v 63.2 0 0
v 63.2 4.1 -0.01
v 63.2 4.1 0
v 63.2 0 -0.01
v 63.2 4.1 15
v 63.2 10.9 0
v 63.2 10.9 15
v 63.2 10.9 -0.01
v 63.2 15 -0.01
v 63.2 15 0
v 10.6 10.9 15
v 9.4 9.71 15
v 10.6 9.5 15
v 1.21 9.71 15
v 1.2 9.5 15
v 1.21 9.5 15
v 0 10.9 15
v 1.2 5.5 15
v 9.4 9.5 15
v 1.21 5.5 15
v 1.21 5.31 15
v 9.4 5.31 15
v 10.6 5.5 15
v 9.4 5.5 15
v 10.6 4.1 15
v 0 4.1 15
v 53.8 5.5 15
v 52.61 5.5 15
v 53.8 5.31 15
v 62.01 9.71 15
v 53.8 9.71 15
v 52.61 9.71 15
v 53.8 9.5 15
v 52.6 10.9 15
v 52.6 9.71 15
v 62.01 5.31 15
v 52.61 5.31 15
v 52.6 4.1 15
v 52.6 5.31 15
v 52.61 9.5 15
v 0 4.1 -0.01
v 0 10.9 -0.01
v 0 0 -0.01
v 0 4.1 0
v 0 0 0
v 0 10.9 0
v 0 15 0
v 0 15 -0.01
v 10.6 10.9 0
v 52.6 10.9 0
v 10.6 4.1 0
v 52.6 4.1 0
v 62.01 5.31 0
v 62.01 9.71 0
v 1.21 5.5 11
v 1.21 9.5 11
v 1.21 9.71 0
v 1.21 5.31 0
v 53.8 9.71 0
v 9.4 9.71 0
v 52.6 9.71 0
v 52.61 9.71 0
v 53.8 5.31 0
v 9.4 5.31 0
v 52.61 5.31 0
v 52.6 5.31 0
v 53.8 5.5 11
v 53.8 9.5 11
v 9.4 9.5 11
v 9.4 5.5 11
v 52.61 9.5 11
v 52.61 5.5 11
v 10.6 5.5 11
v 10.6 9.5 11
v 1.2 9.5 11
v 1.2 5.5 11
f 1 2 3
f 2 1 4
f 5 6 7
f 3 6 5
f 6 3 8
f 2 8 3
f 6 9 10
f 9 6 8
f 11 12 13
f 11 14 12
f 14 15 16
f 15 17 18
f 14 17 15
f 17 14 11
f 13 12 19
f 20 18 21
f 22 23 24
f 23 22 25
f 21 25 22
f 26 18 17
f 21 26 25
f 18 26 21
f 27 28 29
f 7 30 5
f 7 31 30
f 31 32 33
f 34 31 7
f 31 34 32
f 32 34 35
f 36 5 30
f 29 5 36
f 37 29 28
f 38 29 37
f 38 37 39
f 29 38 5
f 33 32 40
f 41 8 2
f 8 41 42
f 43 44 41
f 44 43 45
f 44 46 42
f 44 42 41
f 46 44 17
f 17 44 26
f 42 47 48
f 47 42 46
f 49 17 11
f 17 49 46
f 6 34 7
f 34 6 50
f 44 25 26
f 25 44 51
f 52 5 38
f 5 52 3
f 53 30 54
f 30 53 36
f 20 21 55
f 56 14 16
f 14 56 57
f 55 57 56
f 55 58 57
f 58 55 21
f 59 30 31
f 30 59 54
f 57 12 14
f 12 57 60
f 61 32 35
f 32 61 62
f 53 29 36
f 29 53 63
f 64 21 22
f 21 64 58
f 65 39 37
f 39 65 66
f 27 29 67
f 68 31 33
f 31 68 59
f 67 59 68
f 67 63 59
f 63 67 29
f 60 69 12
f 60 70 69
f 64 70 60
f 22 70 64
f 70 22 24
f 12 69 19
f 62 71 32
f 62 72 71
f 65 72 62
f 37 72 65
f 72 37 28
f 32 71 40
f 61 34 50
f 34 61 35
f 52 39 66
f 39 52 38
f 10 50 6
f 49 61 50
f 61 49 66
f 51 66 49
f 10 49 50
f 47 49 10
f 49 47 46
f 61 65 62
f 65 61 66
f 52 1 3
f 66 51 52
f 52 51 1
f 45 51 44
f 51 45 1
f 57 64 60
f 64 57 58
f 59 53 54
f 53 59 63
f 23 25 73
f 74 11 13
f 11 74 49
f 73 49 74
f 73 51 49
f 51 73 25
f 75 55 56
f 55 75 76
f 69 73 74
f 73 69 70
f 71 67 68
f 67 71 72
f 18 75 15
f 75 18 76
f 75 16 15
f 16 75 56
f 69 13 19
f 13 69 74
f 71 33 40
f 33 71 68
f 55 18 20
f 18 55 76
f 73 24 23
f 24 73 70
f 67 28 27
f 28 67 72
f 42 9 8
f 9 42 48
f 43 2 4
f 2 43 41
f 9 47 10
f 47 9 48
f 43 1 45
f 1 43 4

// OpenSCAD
// file: ../Base/PlacementOptions.scad
// Fischertechnik Box Foundation
// Placement Options

// Alignment
NoAlign = 0;
AlignLeft = 1;
AlignBottom = 2;
AlignCenter = 3;
AlignRight = 4;
AlignTop = 5;

// Element rotation degree steps
rotations = [0, -90, -180, -270];

// Rotation
NoRotation = 0;
Rotate0 = 0;
Rotate90 = 1;
Rotate180 = 2;
Rotate270 = 3;

// Docking (seen from above)
NoDock = -1;
DockLeft = 0;
DockTop = 1;
DockRight = 2;
DockCorner = 2;
DockBottom = 3;

// Web corners
LowerLeft = 0;
UpperLeft = 1;
UpperRight = 2;
LowerRight = 3;

// Web position relative to corner
LeftOfCorner = 0;
RightOfCorner = 1;
// file: ../Base/Boxes.scad
// Fischertechnik Box Foundation
// Pre-designed Boxes

use <Constants.scad>

include <PlacementOptions.scad>

box190Width = 190;
box190Depth = 130;
box130Width = 130;
box130Depth = 95;

// Values are from an original ec3 box
topBottomDifference = 1.5;
outerHeight = 40;
baseThickness = 1.8;
innerHeight = outerHeight - baseThickness;
stackExcess = 5.7;
radius = 3.5;
wallThickness = 1.5;
tolerance = 0.2;

boxWallThickness = wallThickness;
boxBaseThickness = baseThickness;
boxWebWidth = 3.0;

// getBoxWallThickness()
// Gets the wall thickness of a Fischertechnik Box
function getBoxWallThickness() = boxWallThickness;

// getBoxUsageHeight(height = 38.2)
// Gets the usable height of a Fischertechnik box
// height = Outer height of the box from the bottom to the upper edge.
function getBoxUsageHeight(height = outerHeight) = height - baseThickness - stackExcess;

// getBoxInnerHeight()
// Gets the inner height of a Fischertechnik box, including the stack excess
function getBoxInnerHeight() = innerHeight;

// getBoxBaseThickness()
// Gets the thickness of the Fischertechnik box base.
function getBoxBaseThickness() = boxBaseThickness;

// getBoxWebWidth()
// Gets the width of a box web
function getBoxWebWidth() = boxWebWidth;

// getBox190Space()
// Gets the usable inner space of a Box 190 as an x/y-list
function getBox190Space() = [
    box190Width - 2*getBoxWallThickness() - topBottomDifference, 
    box190Depth - 2*getBoxWallThickness() - topBottomDifference ];

// RoundedCornerPlate(width, depth, height, radius)
// Creates a body plate with rounded corners for a box. Used
// also to create the complete box with the hull module.
// width = Width of the plate
// depth = depth of the plate 
// height = thickness of the plate
// radius = radius of the rounded corner
module RoundedCornerPlate(width, depth, height, radius) {
    translate([radius, radius])
    hull() {
        w = width-2*radius;
        d = depth-2*radius;
        cube([w, d, height]);
        cylinder(height, r=radius, $fn=getFragments());
        translate([w, 0])
            cylinder(height, r=radius, $fn=getFragments());
        translate([w, d])
            cylinder(height, r=radius, $fn=getFragments());
        translate([0, d])
            cylinder(height, r=radius, $fn=getFragments());
    }
}

// BoxBase(width, depth)
// Creates an empty stackable Fischertechnik compatible box
// width = Outer width of the box (190, 130, ...)
// depth = Outer depth of the box (130, 95, ...)

module BoxBase(width, depth, height=outerHeight) {    
    thinPlate = 0.01;

    innerHeight = height - baseThickness;    
    
    module Body(tolerance=tolerance) {
        hull() {
            // Bottom with tolerance to fit into the original boxes when stacked
            translate([-wallThickness+tolerance, -wallThickness+tolerance, -baseThickness])
                RoundedCornerPlate(width-topBottomDifference-2*tolerance, depth-topBottomDifference-2*tolerance, thinPlate, radius);
            
            // Top
            translate([-wallThickness-topBottomDifference/2, -wallThickness-topBottomDifference/2, innerHeight-thinPlate])
                RoundedCornerPlate(width, depth, thinPlate, radius);
         }
    }

    module Cutoff() {
        hull() {
            coWidth = width - 2*wallThickness;
            coDepth = depth - 2*wallThickness;
            
            // Bottom
            RoundedCornerPlate(coWidth-topBottomDifference, coDepth-topBottomDifference, thinPlate, radius);

            // Top
            translate([-topBottomDifference/2, -topBottomDifference/2, innerHeight+thinPlate]) 
                RoundedCornerPlate(coWidth, coDepth, thinPlate, radius);
        }
    }
    
    difference() {        
        Body();
        Cutoff();
        stackOffset = innerHeight - stackExcess;
        translate([0, 0, stackOffset + baseThickness])
            Body(tolerance=0);
    }
}

// Creates the Fischertechnik empty box 130x190 mm and places it at position 0,0
// 190x130 are the outer sizes, the inner space is slightly smaller. Use getBox190Space() to get the inner sizes.
// The box is positioned that the usable inner space is at the 0,0,0 position.

module Box190() {
    BoxBase(box190Width, box190Depth);
}

// Gets the usable inner space of a Box 130 as an x/y-list
function getBox130Space() = [
    box130Width - 2*getBoxWallThickness() - topBottomDifference, 
    box130Depth - 2*getBoxWallThickness() - topBottomDifference ];

// Creates the Fischertechnik empty box 95x130 mm and places it at position 0,0
// 190x130 are the outer sizes, the inner space is slightly smaller. Use getBox190Space() to get the inner sizes.
// The box is positioned that the usable inner space is at the 0,0,0 position.

module Box130() {
    BoxBase(box130Width, box130Depth);
}

// Creates a web at the specified box walls
// corner 0 = LowerLeft, 1 = UpperLeft, 2 = UpperRight, 3 = LowerRight
// side 0 = LeftOfCorner, 1 = RightOfCorner
// distance = Distance in mm from the corner
// boxSpace = inner width and depth of the box (default: Box 190)
// webWidth = length of the web (default is 3 mms)
// webThickness = thickness of the web (default is 1 mm)
// height = Height of the web (standard is getBoxUsageHeight())

module BoxWeb(corner, side, distance, boxSpace=getBox190Space(), webWidth=getBoxWebWidth(), webThickness=1.0, height=getBoxUsageHeight()) {
    sink = getBoxWallThickness()/2;

    width = (corner % 2 == 0) ? 
            (side == LeftOfCorner ? webWidth : webThickness) :
            (side == LeftOfCorner ? webThickness : webWidth);

    depth = (corner % 2 == 0) ? 
            (side == RightOfCorner ? webWidth : webThickness) :
            (side == RightOfCorner ? webThickness : webWidth);
    
    xDiff = corner == LowerLeft ? 
                (side == LeftOfCorner ? -sink : distance) :
            (corner == UpperLeft ?                
                (side == LeftOfCorner ? distance : -sink) :
            (corner == UpperRight ?
                (side == LeftOfCorner ? boxSpace.x-webWidth+sink : boxSpace.x-distance-webThickness) :
                (side == LeftOfCorner ? boxSpace.x-distance-webThickness: boxSpace.x-webWidth+sink)));

    yDiff = corner == LowerLeft ? 
                (side == RightOfCorner ? -sink : distance) :
            (corner == UpperLeft ?
                (side == RightOfCorner ? boxSpace.y-distance-webThickness : boxSpace.y-webWidth+sink) :
            (corner == UpperRight ?
                (side == RightOfCorner ? boxSpace.y-webWidth+sink : boxSpace.y-distance-webThickness) :
                (side == RightOfCorner ? distance : -sink)));
    
    translate([xDiff, yDiff, -getExcess()])
        cube([width, depth, height + 2*getExcess()]);
}
// file: ../Base/Rotation.scad
// Fischertechnik Box Foundation
// Geometry Helpers Rotation

include <PlacementOptions.scad>

// getRotatedSpace(space, rotation=NoRotation)
// Rotates the space dependent on the specified rotation

function getRotatedSpace(space, rotation=NoRotation) = [
    (rotation == Rotate90 || rotation == Rotate270) ? space.y : space.x,
    (rotation == Rotate90 || rotation == Rotate270) ? space.x : space.y
];

// Rotates the given space around the fixed left lower corner
// space = the space the children needs as width/depth list [width,depth]
// rotation = 0 Rotate0 degrees, 1 Rotate90 degrees, 2 Rotate180 degrees, 3 Rotate270 degrees (equivalent to -90)

module RotateFix(space, rotation=NoRotation) {
    dy = (rotation == Rotate0 || rotation == Rotate270) ? 0 :
        (rotation == Rotate90) ? space.x :
        space.y;
    dx = (rotation < Rotate180) ? 0 :
        (rotation == Rotate180) ? space.x :
        space.y;
    
    translate([dx, dy, 0])
        rotate([0, 0, rotations[rotation]])
            children();
}
// file: ../Base/Alignment.scad
// Fischertechnik Box Foundation
// Geometry Helpers Alignment

include <PlacementOptions.scad>

// getAlignedX(elementWidth, spaceWidth, align=AlignRight, offset=0)
// Gets the aligned X offset of an element with the given
// width in the given space.
// elementWidth = The width of the element to positon
// spaceWidth = The space where the element should be aligned
// align = 0 AlignLeft, 1 AlignCenter, 2 AlignRight
// offset = an optional offset from the aligned position. When
// aligned left or centered, then positive values are in X direction.
// When aligned right then positive values are in negative X direction.

function getAlignedX(elementWidth, spaceWidth, align=AlignRight, offset=0) =
    (align == AlignLeft) ?
        offset :
        ((align == AlignCenter) ?
        (spaceWidth - elementWidth)/2 + offset :
        spaceWidth - offset - elementWidth);

// getAlignedY(elementDepth, spaceDepth, align=AlignTop, offset=0)
// Gets the aligned Y offset of an element with the given
// depth in the given space.
// elementDepth = The depth of the element to positon
// spaceDepth = The space where the element should be aligned
// align = 0 AlignBottom, 1 AlignCenter, 2 AlignTop
// offset = an optional offset from the aligned position. When
// aligned bottom or centered, then positive values are in Y direction.
// When aligned top then positive values are in negative Y direction.

function getAlignedY(elementDepth, spaceDepth, align=AlignTop, offset=0) =
    (align == AlignBottom) ?
        offset :
        ((align == AlignCenter) ?
        (spaceDepth - elementDepth)/2 + offset :
        spaceDepth - offset - elementDepth);
// file: ../Base/Constants.scad
// Fischertechnik Box Foundation
// Constants

// Constant values necessary for multiple elements

// Base constants
dividerThickness = 1.2;
excess = 0.01;
fragments = 90;
tolerance = 0.8;

// Gets the thickness of a divider 
function getDividerThickness() = dividerThickness;

// Gets the excess that is used to merge walls into each other
function getExcess() = excess;

// Gets amount of fragments of a cylinder
function getFragments() = fragments;

// Gets the inner tolerance of a frame to each side
function getTolerance() = tolerance;


// Fischertechnik specific constants
axisDiameter = 4;
axisBottomDiameter = axisDiameter + 1;
axisTolerance = 0.2;

// Gets axis diameter of Fischertechnik axis
function getAxisDiameter() = axisDiameter;

// Gets axis diameter tolerance (subtracted for element axis)
function getAxisTolerance() = axisTolerance;

// Gets the axis diameter for standing axis
function getStandAxisDiameter() = getAxisDiameter() - getAxisTolerance();

// Gets axis bottom diameter for thicker part at the bottom
function getAxisBottomDiameter() = axisBottomDiameter;

standardEdgeDistance = 2.5;
standardWebDistance = 11.5;
standardCornerLength = 15;

// gets the standard distance to the wall of the box for dockable frames with webs
function getStandardEdgeDistance() = standardEdgeDistance;

// gets the standard distance of each web to the corner of the dockable frame
function getStandardWebDistance() = standardWebDistance;

// gets the standard length of the corner walls of a dockable frame
function getStandardCornerLength() = standardCornerLength;

tubeWallFactor = 0.8;

// gets the wall thickness of a tube.
function getTubeWallThickness() = tubeWallFactor * getDividerThickness();

smallPartsFrameHeight = 20;

// gets the frame height for docked small parts boxes.
function getSmallPartsFrameHeight() = smallPartsFrameHeight;

hubRingDiameter = 19.5;
hubRingLevelDiameter = 21;

// gets the diameter of a tube matching the inner ring of a wheel
function getHubRingDiameter() = hubRingDiameter;

// gets the diameter of a hub tube with a thicker diameter
function getHubRingLevelDiameter() = hubRingLevelDiameter;
// file: FrameAxis60.scad
// Fischertechnik Box Library
// Frame for single 60 mm Axis
// 31032

use <../ModelBase/Complex.scad>

length = 60;

// getFrameAxis60Space()
// Gets the width (.x) and depth (.y) of the axis frame.

function getFrameAxis60Space() = getFrameAxisSpace(length);

// FrameAxis60()
// Axis holder for a single 60 mm axis.

module FrameAxis60() {
    FrameAxis(length);
}

// Test
color("lightgray")
FrameAxis60();
// file: ../Base/Placement.scad
// Fischertechnik Box Foundation
// Geometry Helpers Placement

use <Constants.scad>
use <Alignment.scad>
use <Rotation.scad>
use <Boxes.scad>

include <PlacementOptions.scad>

// Place(x=0, y=0, elementSpace=[0,0], alignX=AlignLeft, alignY=AlignBottom, rotation=Rotate0, boxSpace=getBox190Space())
// Places the child at the specified position
// y = Y-Position. This is a relative position when an X aligment is specified.
// x = X-Position. This is a relative position when an Y aligment is specified.
// elementSpace = space of the element to be placed [x,y]
// alignX = -1=NoAlign, 0 AlignLeft, 1 AlignCenter, 3 AlignRight (elementSpace and boxSpace required!)
// alignY = -1=NoAlign, 2 AlignBottom, 1 AlignCenter, 4 AlignTop (elementSpace and boxSpace required!)
// rotation = 0 Rotate0 0 degrees, 1 Rotate90 90 degrees, 
// 2 Rotate180 180 degrees, 3 Rotate270 270 degrees (equivalent to -90)
// boxSpace = Inner space of the box where the placement occurs [x,y] - default is Box 190x130 inner space

module Place(x=0, y=0, elementSpace=[0,0], 
  alignX=AlignLeft, alignY=AlignBottom, 
  rotation=NoRotation, boxSpace=getBox190Space()) {

    module Position(x, y, space, rotation=Rotate0) {
        translate([x, y, 0])
            RotateFix(space, rotation)
                children();
    }

    space = getRotatedSpace(elementSpace, rotation);
    alignedX = getAlignedX(space.x, boxSpace.x, alignX, x);
    alignedY = getAlignedY(space.y, boxSpace.y, alignY, y);
    Position(alignedX, alignedY, elementSpace, rotation)
        children();
}

// Center(space=getBox130Space(), elementSpace=[0,0])
// space = Space where the children is centered. For cylinder use centered=true and no elementSpace.
// elementSpace = space of the element to be centered [x,y]

module Center(space=getBox190Space(), elementSpace=[0,0]) {
    Place(elementSpace=elementSpace, boxSpace=space, alignX=AlignCenter, alignY=AlignCenter)
        children();
}

// CenterHorizontal(width=0, y=0, offset=0, space=getBox130Space())
// width = Width of the element to be placed.
// y = Y position of the element
// offset = Offset from the center position (negative will be left of the center)
// space = Space where the element is placed

module CenterHorizontal(width=0, y=0, offset=0, space=getBox190Space()) {
    Place(x=offset, y=y, elementSpace=[width, 0], boxSpace=space, alignX=AlignCenter)
        children(0);
}

// CenterVertical(depth=0, x=0, offset=0, space=getBox130Space())
// depth = Depth of the element to be placed.
// x = X position of the element
// offset = Offset from the center position (negative will be down of the center)
// space = Space where the element is placed

module CenterVertical(depth=0, x=0, offset=0, space=getBox190Space()) {
    Place(x=x, y=offset, elementSpace=[0, depth], boxSpace=space, alignY=AlignCenter)
        children(0);
}

// getIsVertical(align)
// True if the specified alignment needs a vertical orientation for a divider (AlignRight, AlignLeft)

function getIsVertical(align) = (align == AlignRight || align == AlignLeft);

// getIsHorizontal(align)
// True if the specified alignment needs a horizontal orientation for a divider (AlignTop, AlignBottom)

function getIsHorizontal(align) = (align == AlignTop || align == AlignBottom);
// main file
// Fischertechnik Box Library
// Frame for 60 mm Axis with gear wheel 28
// 31063

use <../Base/Placement.scad>
use <../ModelBase/Simple.scad>
use <FrameAxis60.scad>

/* [Hidden] */
depth = 15;

// getFrameAxis60WithGearwheelZ28Space()
// Gets the width (.x) and depth (.y) of the axis frame.

function getFrameAxis60WithGearwheelZ28Space() = 
[
    getFrameAxis60Space().x,
    depth
];

// FrameAxis60WithGearwheelZ28()
// Axis holder for a 60 mm axis with gear wheel Z28.

module FrameAxis60WithGearwheelZ28() {
    Space(getFrameAxis60WithGearwheelZ28Space());
    CenterVertical(depth=getFrameAxis60Space().y, space=getFrameAxis60WithGearwheelZ28Space())
        FrameAxis60();
}

// Test
color("lightgray")
FrameAxis60WithGearwheelZ28();
